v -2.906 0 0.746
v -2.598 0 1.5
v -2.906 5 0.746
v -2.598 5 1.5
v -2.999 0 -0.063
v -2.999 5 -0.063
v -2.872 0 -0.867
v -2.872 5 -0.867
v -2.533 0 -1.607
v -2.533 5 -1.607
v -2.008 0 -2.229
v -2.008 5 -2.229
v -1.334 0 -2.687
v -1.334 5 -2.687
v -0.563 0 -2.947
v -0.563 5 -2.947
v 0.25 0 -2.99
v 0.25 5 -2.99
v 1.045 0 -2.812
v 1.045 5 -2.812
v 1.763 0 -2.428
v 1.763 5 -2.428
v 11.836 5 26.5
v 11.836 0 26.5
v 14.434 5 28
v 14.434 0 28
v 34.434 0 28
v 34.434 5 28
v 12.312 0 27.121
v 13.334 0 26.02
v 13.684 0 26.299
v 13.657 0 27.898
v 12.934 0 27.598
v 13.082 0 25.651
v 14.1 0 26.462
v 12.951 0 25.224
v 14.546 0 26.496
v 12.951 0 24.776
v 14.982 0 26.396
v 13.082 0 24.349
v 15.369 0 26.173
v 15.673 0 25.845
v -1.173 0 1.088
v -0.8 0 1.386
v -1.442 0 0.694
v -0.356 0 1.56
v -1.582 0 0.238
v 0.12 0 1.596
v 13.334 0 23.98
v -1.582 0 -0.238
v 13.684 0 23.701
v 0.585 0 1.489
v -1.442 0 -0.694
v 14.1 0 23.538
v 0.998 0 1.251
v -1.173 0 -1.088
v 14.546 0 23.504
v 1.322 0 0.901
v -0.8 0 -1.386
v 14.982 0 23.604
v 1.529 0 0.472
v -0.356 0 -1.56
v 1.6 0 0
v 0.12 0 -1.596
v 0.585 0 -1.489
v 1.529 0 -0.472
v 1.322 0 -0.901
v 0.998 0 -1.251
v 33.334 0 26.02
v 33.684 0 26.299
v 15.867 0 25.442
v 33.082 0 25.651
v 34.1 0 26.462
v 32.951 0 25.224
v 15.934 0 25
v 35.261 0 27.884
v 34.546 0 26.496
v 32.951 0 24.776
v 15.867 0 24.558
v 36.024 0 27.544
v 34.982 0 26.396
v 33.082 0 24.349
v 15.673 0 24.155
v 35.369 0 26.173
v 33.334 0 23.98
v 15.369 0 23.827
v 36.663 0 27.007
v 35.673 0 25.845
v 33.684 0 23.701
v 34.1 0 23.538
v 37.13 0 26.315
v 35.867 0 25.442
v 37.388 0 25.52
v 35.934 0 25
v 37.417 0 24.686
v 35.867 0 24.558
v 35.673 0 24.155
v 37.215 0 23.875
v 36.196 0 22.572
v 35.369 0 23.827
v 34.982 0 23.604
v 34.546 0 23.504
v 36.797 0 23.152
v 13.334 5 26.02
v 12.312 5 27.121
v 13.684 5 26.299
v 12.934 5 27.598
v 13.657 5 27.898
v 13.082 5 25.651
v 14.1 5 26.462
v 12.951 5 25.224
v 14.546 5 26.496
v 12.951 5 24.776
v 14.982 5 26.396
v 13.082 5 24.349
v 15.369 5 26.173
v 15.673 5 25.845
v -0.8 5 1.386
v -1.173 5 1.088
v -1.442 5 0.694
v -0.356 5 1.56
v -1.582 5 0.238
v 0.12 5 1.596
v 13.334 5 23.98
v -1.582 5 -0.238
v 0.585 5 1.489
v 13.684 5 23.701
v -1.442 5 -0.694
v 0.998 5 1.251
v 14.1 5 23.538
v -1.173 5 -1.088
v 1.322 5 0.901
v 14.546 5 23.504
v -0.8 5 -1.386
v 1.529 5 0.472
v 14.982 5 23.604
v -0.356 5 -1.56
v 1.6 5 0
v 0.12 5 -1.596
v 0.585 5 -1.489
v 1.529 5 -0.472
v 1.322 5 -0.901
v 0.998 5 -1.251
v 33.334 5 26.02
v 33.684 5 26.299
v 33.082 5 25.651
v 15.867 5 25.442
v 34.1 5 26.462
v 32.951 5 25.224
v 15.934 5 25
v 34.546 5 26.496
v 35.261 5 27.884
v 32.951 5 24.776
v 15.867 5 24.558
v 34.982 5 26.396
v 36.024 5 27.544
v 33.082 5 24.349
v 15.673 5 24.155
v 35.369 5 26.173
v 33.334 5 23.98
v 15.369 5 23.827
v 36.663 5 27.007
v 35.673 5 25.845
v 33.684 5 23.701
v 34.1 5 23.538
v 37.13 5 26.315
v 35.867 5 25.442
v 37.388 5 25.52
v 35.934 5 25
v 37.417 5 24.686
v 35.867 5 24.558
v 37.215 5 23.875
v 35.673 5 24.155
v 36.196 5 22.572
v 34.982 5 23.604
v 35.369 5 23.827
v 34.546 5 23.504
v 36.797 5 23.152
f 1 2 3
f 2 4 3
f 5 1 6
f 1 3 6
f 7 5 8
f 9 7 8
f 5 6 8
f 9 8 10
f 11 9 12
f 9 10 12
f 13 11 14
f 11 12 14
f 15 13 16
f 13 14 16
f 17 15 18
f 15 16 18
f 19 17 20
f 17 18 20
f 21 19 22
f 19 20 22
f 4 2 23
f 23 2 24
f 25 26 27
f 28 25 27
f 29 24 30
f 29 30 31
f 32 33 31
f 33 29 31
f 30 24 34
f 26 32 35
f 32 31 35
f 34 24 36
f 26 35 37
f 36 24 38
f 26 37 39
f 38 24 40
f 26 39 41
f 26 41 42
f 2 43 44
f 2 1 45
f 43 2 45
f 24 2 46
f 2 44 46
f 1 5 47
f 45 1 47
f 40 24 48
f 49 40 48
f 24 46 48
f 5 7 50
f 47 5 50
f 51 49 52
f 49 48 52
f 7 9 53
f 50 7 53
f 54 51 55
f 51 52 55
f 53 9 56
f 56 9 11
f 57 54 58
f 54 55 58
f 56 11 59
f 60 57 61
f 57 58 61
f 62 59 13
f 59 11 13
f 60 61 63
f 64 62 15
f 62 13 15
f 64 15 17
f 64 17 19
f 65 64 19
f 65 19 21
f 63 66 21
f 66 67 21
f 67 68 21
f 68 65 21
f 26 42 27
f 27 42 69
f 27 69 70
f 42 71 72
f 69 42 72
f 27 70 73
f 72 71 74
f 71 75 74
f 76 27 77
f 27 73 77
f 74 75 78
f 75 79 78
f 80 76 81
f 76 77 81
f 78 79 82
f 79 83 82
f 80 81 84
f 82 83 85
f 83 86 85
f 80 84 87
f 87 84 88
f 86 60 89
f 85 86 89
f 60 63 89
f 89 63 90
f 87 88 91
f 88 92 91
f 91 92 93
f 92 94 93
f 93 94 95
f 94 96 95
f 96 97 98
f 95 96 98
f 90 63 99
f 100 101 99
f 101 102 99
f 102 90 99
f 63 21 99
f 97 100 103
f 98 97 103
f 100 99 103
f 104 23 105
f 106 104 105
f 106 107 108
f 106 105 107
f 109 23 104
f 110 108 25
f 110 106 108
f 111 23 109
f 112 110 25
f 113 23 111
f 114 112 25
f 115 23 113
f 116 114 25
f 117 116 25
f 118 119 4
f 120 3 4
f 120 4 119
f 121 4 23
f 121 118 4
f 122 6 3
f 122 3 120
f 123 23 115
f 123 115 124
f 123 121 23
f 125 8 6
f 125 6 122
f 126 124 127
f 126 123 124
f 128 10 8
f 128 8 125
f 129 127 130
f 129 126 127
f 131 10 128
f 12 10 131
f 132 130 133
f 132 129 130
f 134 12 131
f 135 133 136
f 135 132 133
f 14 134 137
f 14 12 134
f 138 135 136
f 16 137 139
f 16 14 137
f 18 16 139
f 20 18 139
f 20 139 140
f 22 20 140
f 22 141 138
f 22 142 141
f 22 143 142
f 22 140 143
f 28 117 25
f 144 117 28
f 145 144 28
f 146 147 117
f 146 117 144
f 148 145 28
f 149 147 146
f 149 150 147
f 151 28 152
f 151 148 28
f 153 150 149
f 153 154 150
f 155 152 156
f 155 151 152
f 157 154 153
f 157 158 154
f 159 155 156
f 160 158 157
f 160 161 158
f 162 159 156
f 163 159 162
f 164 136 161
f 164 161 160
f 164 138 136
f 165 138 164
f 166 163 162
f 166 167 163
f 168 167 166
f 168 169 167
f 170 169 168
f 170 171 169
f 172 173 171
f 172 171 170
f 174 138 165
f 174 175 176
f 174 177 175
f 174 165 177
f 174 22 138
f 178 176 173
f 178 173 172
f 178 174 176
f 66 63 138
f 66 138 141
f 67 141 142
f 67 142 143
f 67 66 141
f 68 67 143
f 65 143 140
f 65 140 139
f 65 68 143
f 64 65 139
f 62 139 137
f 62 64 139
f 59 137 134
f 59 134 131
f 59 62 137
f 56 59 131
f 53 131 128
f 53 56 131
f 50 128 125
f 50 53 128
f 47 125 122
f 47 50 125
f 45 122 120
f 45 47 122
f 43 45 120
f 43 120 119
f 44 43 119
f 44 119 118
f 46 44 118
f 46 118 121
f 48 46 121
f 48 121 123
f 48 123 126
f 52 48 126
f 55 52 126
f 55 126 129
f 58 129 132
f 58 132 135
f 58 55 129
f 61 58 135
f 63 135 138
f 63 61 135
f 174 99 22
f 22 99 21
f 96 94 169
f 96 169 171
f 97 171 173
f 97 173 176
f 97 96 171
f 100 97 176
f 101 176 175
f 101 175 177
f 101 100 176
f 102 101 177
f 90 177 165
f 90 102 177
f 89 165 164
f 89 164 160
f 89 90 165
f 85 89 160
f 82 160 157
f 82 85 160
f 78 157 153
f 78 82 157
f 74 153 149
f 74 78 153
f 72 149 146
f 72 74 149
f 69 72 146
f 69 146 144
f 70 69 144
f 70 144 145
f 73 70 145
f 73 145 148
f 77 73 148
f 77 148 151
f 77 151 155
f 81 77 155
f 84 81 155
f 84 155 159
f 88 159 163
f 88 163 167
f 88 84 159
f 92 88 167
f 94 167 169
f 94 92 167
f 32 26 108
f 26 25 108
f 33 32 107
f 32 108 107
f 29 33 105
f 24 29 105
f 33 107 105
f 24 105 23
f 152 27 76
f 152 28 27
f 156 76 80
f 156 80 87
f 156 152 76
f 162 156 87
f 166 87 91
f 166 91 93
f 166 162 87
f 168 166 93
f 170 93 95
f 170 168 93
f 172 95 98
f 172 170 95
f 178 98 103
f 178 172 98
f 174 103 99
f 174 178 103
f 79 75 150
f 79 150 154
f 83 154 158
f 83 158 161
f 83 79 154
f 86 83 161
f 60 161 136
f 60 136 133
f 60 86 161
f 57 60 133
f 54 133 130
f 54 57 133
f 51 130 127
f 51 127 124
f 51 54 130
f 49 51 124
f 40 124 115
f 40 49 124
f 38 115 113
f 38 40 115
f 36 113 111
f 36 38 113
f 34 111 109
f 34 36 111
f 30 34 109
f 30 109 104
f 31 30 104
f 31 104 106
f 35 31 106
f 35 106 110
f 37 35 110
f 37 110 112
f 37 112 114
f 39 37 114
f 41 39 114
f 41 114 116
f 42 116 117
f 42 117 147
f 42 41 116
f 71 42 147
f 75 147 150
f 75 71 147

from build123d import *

# Parameters (mm, degrees)
SKETCH2_R           = 1.6
SKETCH2_R_2         = 1.5
BOSS_EXTRUDE2_DEPTH = 5
FILLET1_R           = 3


with BuildPart() as part:
    # Sketch2 → Boss-Extrude2 (new body)
    with BuildSketch(Plane(origin=(0, 0, 0), x_dir=(1, 0, 0), z_dir=(0, 1, 0))):
        Polygon((12.701705922, -28), (43.672062905, -28), (-9.649224004, 10.712946228), align=None)
        Circle(SKETCH2_R, mode=Mode.SUBTRACT)
        with Locations((14.43375673, -25)):
            Circle(SKETCH2_R_2, mode=Mode.SUBTRACT)
        with Locations((34.43375673, -25)):
            Circle(SKETCH2_R_2, mode=Mode.SUBTRACT)
    extrude(amount=BOSS_EXTRUDE2_DEPTH)

    # Fillet1
    fillet1_edges = [part.edges().sort_by_distance(p)[0] for p in [
        (43.672062905, 2.5, 28),
        (12.701705922, 2.5, 28),
        (-9.649224004, 2.5, -10.712946228),
    ]]
    fillet(fillet1_edges, radius=FILLET1_R)


solid = part.part
